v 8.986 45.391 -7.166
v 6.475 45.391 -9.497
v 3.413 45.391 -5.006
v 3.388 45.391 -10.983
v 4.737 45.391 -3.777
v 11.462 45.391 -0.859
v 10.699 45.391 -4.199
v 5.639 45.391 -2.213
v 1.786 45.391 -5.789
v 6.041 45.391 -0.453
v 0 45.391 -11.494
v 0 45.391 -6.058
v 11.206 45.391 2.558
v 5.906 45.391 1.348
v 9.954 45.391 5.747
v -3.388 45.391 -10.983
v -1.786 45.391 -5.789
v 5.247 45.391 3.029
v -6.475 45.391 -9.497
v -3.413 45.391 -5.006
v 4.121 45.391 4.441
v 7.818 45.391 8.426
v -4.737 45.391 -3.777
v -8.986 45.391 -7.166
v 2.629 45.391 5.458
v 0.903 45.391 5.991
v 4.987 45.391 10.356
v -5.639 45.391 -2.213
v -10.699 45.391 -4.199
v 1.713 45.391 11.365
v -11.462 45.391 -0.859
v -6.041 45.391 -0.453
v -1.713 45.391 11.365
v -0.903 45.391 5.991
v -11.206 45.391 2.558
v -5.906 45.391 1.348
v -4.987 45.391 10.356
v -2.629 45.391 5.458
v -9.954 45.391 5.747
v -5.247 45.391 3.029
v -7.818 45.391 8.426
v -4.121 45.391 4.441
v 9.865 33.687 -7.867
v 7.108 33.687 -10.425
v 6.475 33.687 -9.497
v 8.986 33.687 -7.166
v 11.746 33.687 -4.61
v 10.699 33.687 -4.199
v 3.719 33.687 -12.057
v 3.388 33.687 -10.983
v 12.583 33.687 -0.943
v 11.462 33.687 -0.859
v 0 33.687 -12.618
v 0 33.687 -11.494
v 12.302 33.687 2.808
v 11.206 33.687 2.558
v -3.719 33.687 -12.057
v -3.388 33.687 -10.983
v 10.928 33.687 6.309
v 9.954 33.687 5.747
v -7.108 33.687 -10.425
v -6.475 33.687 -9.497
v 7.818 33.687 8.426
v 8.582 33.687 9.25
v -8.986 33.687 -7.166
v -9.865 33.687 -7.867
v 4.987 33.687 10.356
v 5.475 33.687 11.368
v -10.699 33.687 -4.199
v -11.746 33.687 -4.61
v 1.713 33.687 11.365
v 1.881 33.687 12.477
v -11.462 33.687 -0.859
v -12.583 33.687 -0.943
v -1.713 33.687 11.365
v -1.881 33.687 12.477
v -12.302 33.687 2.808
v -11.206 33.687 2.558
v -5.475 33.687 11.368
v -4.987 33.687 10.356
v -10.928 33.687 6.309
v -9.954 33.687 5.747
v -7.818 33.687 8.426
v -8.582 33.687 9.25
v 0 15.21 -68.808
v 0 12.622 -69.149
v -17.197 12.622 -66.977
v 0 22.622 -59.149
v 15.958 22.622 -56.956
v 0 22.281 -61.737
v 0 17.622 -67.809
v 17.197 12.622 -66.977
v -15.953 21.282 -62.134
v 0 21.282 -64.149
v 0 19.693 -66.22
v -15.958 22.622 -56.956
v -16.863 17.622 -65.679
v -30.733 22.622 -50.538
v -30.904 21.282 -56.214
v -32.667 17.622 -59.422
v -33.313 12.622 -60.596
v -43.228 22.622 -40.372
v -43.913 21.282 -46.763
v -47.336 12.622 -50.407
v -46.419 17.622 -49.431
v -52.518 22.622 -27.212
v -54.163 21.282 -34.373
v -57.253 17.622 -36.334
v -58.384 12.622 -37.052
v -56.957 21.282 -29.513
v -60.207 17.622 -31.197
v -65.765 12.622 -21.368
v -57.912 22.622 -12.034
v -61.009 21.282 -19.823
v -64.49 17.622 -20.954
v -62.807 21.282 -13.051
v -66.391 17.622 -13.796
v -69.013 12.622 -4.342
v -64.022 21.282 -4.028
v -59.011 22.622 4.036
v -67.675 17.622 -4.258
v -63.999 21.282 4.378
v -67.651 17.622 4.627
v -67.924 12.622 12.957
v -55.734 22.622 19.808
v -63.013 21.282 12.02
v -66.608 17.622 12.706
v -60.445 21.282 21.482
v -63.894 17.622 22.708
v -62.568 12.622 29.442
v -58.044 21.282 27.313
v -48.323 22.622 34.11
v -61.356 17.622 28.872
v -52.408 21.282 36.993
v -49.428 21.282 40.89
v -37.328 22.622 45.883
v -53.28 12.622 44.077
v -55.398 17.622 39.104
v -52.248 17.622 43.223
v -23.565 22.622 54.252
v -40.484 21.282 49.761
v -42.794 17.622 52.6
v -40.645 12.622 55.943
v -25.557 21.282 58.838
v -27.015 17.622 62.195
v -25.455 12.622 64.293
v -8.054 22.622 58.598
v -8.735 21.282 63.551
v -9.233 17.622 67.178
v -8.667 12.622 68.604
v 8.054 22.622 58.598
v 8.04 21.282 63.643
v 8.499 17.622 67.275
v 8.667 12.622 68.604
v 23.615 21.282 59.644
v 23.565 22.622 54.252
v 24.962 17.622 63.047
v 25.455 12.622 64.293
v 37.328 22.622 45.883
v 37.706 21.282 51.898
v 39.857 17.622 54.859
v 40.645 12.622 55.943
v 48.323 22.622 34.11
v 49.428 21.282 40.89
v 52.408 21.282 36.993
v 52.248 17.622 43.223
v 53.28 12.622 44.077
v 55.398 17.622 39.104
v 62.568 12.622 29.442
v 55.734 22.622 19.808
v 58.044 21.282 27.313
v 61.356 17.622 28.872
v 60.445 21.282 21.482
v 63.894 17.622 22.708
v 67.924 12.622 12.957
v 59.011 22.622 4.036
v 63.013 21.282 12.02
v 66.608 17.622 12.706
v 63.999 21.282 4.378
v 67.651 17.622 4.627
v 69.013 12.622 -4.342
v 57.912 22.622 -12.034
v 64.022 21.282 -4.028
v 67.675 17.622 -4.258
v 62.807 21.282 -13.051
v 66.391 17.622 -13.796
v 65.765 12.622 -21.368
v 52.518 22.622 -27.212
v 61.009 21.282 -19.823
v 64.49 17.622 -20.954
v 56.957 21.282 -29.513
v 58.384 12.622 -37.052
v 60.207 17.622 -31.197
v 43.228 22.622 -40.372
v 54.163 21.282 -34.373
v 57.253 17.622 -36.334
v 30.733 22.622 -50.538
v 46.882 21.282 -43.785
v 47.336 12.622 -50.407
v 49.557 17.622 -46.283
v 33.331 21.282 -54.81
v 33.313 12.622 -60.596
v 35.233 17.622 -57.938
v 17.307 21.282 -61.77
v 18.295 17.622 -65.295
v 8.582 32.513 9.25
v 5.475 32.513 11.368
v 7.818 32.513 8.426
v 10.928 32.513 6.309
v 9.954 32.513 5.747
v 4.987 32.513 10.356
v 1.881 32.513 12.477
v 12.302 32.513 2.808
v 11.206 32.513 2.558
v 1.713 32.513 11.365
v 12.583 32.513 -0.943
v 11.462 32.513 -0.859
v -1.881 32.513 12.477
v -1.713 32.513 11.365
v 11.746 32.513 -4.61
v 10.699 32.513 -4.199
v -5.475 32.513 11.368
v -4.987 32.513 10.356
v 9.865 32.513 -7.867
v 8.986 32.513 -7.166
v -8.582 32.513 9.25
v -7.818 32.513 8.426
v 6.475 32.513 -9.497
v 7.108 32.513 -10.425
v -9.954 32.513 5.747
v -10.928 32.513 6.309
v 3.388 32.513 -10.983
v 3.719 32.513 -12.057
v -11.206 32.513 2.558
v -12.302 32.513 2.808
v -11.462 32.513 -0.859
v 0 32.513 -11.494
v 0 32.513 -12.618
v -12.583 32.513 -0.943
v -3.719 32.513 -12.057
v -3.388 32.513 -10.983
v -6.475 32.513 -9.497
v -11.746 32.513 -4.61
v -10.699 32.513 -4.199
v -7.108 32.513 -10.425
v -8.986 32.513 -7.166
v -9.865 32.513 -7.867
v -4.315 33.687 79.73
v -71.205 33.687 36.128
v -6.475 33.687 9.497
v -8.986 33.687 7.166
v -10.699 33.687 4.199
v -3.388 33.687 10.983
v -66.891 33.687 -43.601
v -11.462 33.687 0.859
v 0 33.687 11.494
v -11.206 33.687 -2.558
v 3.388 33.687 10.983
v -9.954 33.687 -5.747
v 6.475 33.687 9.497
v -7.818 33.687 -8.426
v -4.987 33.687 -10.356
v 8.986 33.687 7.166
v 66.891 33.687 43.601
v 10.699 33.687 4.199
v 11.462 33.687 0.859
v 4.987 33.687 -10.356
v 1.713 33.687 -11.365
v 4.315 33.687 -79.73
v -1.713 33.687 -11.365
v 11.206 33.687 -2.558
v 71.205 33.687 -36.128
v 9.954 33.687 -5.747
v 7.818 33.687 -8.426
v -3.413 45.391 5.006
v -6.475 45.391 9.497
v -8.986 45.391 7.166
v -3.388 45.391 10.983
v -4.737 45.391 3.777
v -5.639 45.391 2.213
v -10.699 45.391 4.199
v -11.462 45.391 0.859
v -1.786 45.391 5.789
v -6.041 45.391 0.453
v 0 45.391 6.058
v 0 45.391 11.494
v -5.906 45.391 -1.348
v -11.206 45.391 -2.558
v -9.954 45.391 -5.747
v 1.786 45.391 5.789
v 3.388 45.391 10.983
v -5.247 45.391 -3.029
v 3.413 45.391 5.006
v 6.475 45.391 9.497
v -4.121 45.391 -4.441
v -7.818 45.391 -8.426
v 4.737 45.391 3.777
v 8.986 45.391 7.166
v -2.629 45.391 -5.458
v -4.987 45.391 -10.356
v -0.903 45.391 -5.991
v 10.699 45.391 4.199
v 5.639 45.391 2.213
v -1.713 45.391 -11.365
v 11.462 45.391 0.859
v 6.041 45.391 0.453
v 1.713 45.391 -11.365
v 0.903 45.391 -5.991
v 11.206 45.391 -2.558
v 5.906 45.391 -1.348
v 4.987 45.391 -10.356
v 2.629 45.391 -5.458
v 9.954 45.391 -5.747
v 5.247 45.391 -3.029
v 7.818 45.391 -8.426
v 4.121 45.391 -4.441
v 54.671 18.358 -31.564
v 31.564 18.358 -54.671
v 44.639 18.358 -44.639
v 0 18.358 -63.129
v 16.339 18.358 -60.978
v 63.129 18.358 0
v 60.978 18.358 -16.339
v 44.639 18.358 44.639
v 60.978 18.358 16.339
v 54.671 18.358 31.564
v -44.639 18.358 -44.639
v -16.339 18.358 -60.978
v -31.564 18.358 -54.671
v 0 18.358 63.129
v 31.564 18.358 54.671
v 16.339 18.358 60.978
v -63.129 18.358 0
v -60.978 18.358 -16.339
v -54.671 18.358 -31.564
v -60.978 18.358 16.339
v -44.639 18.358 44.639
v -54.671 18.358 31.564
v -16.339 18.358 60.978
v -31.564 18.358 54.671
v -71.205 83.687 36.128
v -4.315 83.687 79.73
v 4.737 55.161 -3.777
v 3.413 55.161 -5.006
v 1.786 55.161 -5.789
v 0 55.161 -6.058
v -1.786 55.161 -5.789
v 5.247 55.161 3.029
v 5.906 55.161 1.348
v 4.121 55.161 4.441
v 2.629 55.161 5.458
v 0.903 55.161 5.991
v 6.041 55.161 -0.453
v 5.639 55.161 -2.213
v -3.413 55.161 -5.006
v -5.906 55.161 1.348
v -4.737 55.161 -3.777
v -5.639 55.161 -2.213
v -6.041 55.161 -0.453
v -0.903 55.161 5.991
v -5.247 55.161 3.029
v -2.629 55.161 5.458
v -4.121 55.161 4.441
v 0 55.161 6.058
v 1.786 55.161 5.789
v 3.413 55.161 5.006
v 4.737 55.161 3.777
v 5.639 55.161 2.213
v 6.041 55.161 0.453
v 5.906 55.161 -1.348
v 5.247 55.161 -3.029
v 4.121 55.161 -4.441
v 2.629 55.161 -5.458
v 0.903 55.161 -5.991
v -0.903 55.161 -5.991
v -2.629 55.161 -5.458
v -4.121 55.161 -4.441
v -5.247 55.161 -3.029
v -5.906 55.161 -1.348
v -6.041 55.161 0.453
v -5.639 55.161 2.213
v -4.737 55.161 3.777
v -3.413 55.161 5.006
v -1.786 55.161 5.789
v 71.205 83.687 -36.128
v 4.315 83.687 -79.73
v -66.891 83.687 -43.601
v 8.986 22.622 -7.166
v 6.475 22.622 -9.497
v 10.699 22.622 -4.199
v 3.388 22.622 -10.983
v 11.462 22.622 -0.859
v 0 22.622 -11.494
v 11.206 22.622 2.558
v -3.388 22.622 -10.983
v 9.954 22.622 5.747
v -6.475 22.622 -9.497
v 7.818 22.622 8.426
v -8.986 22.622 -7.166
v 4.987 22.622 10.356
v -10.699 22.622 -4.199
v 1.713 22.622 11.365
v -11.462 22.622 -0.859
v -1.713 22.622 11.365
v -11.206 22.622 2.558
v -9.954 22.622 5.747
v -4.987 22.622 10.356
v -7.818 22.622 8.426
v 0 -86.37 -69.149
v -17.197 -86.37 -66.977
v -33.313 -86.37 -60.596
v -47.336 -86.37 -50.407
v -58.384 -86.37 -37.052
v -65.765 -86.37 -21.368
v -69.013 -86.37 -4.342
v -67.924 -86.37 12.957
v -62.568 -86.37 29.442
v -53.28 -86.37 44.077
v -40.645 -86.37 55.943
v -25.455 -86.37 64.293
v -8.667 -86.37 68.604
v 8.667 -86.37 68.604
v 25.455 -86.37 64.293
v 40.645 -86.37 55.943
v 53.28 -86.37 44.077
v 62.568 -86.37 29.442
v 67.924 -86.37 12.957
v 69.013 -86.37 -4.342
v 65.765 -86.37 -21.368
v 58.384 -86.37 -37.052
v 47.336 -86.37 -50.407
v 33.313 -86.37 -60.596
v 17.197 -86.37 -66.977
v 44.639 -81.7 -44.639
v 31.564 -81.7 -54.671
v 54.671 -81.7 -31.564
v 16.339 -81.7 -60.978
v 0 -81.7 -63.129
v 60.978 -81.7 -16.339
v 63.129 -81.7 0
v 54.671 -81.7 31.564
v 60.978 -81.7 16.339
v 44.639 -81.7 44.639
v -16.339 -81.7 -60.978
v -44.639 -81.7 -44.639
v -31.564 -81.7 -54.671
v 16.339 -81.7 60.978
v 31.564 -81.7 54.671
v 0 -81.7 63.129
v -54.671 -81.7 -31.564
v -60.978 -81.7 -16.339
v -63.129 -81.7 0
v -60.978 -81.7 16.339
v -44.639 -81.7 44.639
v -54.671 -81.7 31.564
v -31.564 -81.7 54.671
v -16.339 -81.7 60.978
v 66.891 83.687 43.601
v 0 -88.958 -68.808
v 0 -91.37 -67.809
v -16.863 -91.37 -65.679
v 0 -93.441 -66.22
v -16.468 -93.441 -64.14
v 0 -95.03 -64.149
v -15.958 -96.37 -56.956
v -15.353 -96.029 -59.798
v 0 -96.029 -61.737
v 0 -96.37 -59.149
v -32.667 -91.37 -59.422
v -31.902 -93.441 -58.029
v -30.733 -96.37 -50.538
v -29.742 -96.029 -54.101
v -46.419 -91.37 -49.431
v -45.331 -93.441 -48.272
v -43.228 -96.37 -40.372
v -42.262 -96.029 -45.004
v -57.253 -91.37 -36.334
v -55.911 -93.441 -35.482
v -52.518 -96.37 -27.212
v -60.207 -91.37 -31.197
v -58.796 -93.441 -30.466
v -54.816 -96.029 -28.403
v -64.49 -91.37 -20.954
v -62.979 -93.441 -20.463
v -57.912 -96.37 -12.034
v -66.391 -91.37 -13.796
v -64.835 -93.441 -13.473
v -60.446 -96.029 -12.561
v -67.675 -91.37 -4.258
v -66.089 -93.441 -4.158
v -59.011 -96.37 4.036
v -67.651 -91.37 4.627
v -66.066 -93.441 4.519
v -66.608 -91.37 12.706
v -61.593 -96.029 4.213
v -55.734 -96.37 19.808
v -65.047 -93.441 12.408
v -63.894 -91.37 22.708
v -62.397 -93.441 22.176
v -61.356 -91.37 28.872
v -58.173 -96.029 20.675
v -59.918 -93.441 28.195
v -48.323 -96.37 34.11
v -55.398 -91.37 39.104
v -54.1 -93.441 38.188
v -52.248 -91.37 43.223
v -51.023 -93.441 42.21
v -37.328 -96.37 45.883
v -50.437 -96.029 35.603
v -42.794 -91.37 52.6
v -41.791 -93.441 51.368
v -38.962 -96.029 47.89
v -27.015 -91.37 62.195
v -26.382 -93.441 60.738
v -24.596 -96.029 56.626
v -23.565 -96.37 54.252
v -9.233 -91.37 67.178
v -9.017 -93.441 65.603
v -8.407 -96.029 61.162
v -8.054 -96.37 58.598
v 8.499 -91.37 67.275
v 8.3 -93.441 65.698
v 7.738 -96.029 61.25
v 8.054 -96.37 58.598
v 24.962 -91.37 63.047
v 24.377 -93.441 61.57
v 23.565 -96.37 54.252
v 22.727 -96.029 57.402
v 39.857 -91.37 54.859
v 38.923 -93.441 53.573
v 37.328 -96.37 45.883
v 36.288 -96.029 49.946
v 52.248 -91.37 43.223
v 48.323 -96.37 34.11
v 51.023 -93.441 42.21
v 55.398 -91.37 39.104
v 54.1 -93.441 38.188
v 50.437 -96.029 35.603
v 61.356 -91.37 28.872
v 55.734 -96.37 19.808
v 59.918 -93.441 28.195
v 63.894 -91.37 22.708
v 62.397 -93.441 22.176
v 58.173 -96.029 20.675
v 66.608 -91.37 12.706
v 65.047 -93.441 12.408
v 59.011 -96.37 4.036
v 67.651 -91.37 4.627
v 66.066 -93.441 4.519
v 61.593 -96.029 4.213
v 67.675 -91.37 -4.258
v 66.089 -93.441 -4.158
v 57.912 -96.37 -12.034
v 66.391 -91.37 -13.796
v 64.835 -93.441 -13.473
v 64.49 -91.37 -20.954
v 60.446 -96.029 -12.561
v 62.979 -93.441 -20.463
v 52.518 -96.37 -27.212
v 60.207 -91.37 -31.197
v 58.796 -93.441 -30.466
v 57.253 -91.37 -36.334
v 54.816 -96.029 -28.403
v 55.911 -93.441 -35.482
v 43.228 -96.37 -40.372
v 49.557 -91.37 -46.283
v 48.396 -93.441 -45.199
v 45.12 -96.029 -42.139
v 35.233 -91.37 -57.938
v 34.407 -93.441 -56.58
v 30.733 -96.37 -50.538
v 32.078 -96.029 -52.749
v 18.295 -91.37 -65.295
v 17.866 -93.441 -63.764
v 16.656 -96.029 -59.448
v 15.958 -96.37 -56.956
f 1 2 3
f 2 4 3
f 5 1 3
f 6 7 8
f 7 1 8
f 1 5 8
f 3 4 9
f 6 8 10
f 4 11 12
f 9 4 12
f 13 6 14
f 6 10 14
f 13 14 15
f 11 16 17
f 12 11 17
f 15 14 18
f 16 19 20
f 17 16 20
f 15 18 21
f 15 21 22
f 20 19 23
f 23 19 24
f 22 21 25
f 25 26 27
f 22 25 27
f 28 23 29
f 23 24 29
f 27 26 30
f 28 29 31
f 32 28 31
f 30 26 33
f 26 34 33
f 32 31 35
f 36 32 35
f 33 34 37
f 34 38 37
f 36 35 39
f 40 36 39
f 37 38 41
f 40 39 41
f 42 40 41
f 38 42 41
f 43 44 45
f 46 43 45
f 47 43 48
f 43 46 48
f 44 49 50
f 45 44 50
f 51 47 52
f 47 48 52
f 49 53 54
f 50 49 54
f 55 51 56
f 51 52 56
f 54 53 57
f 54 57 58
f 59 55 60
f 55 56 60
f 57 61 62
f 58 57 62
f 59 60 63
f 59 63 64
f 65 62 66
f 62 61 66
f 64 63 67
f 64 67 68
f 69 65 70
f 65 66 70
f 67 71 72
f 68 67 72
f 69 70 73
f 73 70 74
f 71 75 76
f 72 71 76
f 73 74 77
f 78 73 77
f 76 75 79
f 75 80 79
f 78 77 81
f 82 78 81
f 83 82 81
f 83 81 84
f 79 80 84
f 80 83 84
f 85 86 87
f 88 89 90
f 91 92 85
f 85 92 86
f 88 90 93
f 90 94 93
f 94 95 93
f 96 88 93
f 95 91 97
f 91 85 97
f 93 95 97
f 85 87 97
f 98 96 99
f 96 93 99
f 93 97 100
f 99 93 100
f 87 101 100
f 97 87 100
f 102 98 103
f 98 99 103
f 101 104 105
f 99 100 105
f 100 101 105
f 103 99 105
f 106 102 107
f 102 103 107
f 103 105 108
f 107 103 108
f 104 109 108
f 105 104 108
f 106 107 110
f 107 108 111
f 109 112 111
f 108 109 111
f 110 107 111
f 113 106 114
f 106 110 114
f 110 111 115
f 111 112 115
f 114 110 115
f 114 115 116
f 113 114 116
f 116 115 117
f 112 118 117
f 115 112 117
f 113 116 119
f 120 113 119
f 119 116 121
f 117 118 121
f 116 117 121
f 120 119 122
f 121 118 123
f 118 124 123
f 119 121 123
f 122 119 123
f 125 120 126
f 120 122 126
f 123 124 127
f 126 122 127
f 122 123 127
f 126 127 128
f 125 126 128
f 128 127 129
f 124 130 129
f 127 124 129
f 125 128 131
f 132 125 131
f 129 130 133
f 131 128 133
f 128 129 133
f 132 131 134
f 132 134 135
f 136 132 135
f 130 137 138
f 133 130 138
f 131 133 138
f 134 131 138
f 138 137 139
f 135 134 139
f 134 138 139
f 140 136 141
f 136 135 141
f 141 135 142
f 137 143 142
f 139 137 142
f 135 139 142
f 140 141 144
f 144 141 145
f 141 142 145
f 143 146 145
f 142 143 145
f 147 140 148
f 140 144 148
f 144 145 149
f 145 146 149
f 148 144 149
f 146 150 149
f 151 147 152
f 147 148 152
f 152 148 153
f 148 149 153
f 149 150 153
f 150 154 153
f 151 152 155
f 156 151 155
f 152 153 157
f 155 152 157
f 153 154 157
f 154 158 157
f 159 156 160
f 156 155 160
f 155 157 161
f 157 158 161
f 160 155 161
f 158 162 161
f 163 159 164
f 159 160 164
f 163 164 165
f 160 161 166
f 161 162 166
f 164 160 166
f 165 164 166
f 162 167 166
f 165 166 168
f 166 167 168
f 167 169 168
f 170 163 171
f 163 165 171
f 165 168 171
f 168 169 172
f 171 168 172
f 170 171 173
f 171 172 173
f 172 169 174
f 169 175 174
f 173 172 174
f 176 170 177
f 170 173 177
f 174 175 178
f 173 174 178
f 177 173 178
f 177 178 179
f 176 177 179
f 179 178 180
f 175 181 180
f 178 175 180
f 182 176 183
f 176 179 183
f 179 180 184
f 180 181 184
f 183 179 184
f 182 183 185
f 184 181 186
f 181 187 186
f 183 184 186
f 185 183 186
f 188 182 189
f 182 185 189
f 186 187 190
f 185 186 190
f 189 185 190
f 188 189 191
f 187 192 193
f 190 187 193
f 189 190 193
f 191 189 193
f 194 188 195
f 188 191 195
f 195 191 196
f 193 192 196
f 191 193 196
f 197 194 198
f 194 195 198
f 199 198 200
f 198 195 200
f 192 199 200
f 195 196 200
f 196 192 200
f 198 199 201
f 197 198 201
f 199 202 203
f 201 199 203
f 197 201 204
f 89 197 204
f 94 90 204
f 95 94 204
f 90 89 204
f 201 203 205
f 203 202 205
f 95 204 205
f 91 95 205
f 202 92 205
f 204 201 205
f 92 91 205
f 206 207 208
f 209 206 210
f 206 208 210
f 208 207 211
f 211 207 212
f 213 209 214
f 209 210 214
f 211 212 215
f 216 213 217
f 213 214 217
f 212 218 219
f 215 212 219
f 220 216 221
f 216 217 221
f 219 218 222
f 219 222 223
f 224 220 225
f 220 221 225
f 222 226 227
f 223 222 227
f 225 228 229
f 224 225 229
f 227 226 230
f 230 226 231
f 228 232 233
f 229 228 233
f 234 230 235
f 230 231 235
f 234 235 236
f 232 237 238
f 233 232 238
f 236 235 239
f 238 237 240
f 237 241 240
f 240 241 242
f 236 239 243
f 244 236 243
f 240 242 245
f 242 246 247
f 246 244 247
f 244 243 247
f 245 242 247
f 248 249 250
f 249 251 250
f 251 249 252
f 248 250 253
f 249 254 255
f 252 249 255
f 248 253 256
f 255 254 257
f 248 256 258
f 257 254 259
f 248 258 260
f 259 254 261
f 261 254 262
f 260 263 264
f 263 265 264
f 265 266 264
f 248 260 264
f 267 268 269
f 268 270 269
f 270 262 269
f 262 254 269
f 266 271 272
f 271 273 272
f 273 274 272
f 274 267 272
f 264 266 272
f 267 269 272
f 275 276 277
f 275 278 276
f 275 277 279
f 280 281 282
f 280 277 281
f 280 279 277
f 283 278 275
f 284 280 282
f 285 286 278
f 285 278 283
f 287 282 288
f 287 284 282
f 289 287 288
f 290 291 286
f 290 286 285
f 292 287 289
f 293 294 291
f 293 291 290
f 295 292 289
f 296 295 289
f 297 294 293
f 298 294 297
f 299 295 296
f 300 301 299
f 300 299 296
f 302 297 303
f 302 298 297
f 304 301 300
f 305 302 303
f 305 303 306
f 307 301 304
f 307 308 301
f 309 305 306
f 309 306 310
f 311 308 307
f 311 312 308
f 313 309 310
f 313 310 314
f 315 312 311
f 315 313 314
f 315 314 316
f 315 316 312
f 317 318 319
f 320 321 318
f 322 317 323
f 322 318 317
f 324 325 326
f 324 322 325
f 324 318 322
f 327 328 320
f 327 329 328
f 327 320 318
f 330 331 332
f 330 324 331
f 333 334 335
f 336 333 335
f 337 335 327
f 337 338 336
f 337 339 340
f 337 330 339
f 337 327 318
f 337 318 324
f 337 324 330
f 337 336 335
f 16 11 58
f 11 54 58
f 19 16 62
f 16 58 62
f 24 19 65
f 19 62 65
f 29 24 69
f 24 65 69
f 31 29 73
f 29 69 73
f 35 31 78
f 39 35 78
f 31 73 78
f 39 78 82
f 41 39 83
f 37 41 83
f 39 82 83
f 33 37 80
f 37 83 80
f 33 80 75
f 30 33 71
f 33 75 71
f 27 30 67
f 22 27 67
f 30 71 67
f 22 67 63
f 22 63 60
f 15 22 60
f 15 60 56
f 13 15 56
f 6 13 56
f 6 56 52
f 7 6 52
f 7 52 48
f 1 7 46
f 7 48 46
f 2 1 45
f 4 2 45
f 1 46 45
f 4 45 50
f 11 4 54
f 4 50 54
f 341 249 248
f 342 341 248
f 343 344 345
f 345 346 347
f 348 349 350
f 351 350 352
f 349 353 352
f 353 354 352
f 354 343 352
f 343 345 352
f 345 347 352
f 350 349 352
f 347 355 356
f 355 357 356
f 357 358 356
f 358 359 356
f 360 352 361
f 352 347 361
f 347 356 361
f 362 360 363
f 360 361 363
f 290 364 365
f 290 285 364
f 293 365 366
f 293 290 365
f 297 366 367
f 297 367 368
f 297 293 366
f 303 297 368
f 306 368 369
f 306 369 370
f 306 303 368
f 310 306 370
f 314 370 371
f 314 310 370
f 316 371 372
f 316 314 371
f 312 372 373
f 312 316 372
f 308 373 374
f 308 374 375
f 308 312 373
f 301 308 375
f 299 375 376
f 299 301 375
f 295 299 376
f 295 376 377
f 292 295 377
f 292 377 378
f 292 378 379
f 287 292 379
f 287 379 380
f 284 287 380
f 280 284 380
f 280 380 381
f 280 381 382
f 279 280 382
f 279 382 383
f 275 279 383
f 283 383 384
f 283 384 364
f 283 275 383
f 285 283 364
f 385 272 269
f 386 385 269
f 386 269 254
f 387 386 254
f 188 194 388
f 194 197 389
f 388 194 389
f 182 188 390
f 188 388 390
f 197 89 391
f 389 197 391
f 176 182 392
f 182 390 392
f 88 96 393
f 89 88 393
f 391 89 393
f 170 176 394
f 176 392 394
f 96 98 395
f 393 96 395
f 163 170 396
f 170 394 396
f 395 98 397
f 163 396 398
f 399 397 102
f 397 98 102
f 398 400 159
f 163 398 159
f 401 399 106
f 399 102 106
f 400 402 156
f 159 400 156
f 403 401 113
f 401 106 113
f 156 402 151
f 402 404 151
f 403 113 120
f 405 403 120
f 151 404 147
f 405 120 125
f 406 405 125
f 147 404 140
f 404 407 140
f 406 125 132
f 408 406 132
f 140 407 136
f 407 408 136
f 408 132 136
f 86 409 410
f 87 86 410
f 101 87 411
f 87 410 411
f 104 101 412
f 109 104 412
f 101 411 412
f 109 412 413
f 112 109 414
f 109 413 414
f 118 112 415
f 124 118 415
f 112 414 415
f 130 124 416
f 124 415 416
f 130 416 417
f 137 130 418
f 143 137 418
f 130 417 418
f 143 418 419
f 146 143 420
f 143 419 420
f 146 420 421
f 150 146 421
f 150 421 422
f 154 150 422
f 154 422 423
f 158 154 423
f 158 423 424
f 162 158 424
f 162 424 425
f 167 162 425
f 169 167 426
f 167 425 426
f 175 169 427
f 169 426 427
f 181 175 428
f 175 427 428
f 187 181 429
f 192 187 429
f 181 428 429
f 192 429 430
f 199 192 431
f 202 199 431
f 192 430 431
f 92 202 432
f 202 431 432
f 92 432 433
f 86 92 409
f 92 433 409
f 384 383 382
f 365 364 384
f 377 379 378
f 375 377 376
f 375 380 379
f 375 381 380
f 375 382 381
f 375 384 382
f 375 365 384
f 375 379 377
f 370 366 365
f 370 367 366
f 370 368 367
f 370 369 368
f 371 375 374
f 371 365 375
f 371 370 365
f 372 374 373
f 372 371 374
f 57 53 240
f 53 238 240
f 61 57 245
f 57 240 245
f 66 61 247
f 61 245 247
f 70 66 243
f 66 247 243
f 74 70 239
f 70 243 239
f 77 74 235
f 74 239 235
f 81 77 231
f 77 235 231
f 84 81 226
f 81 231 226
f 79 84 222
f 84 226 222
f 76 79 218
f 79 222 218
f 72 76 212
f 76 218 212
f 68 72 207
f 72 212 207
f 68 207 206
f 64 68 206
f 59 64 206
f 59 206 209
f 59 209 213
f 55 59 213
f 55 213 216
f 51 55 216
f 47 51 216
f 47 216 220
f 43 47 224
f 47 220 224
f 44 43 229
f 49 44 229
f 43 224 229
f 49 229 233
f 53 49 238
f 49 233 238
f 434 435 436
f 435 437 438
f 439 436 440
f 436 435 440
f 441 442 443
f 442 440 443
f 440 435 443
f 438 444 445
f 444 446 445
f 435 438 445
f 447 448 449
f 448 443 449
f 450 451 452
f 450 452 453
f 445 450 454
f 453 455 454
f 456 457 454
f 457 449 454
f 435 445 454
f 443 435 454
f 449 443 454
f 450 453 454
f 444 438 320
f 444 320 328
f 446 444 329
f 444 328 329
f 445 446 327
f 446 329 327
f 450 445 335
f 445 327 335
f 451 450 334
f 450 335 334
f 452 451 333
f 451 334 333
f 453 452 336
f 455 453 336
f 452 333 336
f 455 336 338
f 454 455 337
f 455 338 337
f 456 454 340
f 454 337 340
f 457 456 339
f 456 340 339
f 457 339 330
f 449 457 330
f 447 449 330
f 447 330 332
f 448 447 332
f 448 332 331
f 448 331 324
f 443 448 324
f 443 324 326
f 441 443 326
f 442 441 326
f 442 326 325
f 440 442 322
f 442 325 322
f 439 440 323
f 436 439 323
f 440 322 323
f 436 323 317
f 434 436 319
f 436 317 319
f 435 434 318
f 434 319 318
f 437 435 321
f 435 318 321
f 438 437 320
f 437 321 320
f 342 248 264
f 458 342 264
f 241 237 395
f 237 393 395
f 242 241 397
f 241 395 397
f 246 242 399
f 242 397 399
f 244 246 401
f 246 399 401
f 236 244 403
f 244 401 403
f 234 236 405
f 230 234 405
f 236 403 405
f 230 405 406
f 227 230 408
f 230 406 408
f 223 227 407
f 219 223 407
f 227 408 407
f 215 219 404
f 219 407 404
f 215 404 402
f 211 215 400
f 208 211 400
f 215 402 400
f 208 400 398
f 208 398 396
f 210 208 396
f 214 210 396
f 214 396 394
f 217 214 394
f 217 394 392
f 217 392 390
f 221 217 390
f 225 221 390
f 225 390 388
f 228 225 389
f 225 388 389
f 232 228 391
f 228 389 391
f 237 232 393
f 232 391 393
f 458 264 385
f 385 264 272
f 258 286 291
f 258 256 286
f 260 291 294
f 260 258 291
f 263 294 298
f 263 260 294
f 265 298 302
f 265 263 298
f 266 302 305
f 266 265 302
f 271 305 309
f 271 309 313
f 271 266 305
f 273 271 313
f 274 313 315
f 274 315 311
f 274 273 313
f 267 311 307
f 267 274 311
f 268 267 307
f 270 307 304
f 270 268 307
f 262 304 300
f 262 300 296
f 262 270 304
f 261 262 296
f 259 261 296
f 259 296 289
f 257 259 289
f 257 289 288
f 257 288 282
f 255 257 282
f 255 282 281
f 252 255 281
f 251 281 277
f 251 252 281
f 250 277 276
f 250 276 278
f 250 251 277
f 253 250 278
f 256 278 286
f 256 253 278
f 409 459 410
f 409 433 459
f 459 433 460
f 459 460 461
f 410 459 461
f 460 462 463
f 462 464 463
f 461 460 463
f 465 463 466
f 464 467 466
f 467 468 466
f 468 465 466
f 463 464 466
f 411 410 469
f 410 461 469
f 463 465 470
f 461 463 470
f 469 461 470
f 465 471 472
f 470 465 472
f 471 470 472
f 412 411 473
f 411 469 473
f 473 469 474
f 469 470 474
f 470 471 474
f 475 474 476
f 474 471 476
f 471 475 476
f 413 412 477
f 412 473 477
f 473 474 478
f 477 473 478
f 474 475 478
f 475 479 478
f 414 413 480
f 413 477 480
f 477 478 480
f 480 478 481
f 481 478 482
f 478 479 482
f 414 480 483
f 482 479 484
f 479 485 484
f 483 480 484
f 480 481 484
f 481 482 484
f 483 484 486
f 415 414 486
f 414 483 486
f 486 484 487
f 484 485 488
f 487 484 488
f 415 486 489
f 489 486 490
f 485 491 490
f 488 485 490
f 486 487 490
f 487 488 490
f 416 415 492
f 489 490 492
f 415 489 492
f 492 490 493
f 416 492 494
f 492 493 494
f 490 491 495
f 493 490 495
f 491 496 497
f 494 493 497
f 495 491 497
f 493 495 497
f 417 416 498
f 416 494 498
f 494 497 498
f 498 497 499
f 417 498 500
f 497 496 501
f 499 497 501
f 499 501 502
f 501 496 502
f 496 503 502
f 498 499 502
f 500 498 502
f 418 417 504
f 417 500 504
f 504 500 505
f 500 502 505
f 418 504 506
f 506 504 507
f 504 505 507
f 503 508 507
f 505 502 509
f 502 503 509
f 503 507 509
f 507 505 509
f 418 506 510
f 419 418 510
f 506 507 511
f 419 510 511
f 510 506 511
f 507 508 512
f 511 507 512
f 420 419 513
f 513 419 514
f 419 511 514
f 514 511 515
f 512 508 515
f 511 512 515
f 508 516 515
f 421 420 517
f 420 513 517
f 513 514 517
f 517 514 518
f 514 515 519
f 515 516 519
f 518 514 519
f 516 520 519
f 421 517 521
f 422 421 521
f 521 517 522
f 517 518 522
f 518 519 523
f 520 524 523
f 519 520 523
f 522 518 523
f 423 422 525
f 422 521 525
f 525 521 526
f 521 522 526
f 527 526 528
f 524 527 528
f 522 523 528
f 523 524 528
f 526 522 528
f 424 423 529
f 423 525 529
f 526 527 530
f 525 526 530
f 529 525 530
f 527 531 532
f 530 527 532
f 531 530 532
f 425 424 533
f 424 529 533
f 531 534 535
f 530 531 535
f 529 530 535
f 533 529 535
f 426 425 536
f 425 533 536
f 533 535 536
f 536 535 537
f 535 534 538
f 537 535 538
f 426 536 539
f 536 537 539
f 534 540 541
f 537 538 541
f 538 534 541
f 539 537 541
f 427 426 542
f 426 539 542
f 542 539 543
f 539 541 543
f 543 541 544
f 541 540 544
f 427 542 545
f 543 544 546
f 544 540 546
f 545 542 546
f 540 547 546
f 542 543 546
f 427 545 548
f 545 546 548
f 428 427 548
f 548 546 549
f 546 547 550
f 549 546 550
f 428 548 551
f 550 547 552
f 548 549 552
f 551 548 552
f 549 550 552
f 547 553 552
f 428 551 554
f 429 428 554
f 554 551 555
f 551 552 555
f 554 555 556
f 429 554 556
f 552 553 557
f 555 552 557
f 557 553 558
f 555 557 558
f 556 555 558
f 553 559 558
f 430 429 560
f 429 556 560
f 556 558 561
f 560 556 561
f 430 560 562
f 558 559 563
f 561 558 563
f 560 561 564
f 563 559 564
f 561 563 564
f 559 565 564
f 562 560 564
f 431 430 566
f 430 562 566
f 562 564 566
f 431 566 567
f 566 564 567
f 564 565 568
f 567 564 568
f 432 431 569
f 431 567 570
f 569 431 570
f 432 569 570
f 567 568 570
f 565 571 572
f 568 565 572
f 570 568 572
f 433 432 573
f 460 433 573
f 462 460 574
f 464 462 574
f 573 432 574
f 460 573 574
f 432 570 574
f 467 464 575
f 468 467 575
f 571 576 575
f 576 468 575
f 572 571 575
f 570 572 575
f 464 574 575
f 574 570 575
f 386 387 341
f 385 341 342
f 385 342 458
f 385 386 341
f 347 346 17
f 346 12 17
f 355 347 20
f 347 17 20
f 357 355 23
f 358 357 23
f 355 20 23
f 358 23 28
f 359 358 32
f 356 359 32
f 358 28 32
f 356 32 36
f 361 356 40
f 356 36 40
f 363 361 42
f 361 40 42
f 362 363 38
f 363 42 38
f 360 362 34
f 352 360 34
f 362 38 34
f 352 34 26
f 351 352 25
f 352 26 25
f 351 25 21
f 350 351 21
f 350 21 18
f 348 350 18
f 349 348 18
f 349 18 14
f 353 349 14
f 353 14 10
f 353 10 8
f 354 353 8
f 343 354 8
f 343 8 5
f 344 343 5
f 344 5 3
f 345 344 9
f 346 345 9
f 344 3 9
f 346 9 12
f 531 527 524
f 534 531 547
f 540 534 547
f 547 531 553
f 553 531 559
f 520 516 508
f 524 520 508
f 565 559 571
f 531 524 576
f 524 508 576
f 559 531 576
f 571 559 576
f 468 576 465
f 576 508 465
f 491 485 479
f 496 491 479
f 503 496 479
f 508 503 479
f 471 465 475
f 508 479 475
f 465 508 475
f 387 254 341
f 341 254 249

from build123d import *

# Parameters (mm, degrees)
FILLET1_R           = 10
FILLET2_R           = 10
BOSS_EXTRUDE1_DEPTH = 50


with BuildPart() as part:
    # Sketch1 → Revolve1 (revolve)
    with BuildSketch(Plane.XY):
        Polygon((0, 55.160580533), (6.058266255, 55.160580533), (6.058266255, 45.391125465), (11.493817419, 45.391125465), (11.493817419, 33.687279666), (12.618009156, 33.687279666), (12.618009156, 32.513459763), (11.493817419, 32.513459763), (11.493817419, 22.621974615), (69.148986921, 22.621974615), (69.148986921, -96.370180365), (0, -96.370180365), (0, -81.699979191), (63.128684076, -81.699979191), (63.128684076, 18.358315997), (5.351591255, 18.358315997), (0, 18.358315997), align=None)
    revolve(axis=Axis((0, 18.358315997, 0), (0, 1, 0)))

    # Fillet1
    fillet1_edges = [part.edges().sort_by_distance(p)[0] for p in [
        (-69.148986921, 22.621974615, 0),
    ]]
    fillet(fillet1_edges, radius=FILLET1_R)

    # Fillet2
    fillet2_edges = [part.edges().sort_by_distance(p)[0] for p in [
        (-69.148986921, -96.370180365, 0),
    ]]
    fillet(fillet2_edges, radius=FILLET2_R)


with BuildPart() as body_2:
    # Sketch2 → Boss-Extrude1 (new body)
    with BuildSketch(Plane(origin=(0, 33.687279666, 0), x_dir=(1, 0, 0), z_dir=(0, 1, 0))):
        Polygon((71.20521716, 36.1283855), (4.314508939, 79.729719693), (-66.890708221, 43.601334193), (-71.20521716, -36.1283855), (-4.314508939, -79.729719693), (66.890708221, -43.601334193), align=None)
    extrude(amount=BOSS_EXTRUDE1_DEPTH)

    # Sketch1<3> → Cut-Revolve1 (revolve, cut)
    with BuildSketch(Plane.XY):
        Polygon((0, 55.160580533), (6.058266255, 55.160580533), (6.058266255, 45.391125465), (11.493817419, 45.391125465), (11.493817419, 33.687279666), (12.618009156, 33.687279666), (12.618009156, 32.513459763), (11.493817419, 32.513459763), (11.493817419, 22.621974615), (69.148986921, 22.621974615), (69.148986921, -96.370180365), (0, -96.370180365), (0, -81.699979191), (63.128684076, -81.699979191), (63.128684076, 18.358315997), (5.351591255, 18.358315997), (0, 18.358315997), align=None)
    revolve(axis=Axis((0, 18.358315997, 0), (0, 1, 0)), mode=Mode.SUBTRACT)


solid = Compound([part.part, body_2.part])
